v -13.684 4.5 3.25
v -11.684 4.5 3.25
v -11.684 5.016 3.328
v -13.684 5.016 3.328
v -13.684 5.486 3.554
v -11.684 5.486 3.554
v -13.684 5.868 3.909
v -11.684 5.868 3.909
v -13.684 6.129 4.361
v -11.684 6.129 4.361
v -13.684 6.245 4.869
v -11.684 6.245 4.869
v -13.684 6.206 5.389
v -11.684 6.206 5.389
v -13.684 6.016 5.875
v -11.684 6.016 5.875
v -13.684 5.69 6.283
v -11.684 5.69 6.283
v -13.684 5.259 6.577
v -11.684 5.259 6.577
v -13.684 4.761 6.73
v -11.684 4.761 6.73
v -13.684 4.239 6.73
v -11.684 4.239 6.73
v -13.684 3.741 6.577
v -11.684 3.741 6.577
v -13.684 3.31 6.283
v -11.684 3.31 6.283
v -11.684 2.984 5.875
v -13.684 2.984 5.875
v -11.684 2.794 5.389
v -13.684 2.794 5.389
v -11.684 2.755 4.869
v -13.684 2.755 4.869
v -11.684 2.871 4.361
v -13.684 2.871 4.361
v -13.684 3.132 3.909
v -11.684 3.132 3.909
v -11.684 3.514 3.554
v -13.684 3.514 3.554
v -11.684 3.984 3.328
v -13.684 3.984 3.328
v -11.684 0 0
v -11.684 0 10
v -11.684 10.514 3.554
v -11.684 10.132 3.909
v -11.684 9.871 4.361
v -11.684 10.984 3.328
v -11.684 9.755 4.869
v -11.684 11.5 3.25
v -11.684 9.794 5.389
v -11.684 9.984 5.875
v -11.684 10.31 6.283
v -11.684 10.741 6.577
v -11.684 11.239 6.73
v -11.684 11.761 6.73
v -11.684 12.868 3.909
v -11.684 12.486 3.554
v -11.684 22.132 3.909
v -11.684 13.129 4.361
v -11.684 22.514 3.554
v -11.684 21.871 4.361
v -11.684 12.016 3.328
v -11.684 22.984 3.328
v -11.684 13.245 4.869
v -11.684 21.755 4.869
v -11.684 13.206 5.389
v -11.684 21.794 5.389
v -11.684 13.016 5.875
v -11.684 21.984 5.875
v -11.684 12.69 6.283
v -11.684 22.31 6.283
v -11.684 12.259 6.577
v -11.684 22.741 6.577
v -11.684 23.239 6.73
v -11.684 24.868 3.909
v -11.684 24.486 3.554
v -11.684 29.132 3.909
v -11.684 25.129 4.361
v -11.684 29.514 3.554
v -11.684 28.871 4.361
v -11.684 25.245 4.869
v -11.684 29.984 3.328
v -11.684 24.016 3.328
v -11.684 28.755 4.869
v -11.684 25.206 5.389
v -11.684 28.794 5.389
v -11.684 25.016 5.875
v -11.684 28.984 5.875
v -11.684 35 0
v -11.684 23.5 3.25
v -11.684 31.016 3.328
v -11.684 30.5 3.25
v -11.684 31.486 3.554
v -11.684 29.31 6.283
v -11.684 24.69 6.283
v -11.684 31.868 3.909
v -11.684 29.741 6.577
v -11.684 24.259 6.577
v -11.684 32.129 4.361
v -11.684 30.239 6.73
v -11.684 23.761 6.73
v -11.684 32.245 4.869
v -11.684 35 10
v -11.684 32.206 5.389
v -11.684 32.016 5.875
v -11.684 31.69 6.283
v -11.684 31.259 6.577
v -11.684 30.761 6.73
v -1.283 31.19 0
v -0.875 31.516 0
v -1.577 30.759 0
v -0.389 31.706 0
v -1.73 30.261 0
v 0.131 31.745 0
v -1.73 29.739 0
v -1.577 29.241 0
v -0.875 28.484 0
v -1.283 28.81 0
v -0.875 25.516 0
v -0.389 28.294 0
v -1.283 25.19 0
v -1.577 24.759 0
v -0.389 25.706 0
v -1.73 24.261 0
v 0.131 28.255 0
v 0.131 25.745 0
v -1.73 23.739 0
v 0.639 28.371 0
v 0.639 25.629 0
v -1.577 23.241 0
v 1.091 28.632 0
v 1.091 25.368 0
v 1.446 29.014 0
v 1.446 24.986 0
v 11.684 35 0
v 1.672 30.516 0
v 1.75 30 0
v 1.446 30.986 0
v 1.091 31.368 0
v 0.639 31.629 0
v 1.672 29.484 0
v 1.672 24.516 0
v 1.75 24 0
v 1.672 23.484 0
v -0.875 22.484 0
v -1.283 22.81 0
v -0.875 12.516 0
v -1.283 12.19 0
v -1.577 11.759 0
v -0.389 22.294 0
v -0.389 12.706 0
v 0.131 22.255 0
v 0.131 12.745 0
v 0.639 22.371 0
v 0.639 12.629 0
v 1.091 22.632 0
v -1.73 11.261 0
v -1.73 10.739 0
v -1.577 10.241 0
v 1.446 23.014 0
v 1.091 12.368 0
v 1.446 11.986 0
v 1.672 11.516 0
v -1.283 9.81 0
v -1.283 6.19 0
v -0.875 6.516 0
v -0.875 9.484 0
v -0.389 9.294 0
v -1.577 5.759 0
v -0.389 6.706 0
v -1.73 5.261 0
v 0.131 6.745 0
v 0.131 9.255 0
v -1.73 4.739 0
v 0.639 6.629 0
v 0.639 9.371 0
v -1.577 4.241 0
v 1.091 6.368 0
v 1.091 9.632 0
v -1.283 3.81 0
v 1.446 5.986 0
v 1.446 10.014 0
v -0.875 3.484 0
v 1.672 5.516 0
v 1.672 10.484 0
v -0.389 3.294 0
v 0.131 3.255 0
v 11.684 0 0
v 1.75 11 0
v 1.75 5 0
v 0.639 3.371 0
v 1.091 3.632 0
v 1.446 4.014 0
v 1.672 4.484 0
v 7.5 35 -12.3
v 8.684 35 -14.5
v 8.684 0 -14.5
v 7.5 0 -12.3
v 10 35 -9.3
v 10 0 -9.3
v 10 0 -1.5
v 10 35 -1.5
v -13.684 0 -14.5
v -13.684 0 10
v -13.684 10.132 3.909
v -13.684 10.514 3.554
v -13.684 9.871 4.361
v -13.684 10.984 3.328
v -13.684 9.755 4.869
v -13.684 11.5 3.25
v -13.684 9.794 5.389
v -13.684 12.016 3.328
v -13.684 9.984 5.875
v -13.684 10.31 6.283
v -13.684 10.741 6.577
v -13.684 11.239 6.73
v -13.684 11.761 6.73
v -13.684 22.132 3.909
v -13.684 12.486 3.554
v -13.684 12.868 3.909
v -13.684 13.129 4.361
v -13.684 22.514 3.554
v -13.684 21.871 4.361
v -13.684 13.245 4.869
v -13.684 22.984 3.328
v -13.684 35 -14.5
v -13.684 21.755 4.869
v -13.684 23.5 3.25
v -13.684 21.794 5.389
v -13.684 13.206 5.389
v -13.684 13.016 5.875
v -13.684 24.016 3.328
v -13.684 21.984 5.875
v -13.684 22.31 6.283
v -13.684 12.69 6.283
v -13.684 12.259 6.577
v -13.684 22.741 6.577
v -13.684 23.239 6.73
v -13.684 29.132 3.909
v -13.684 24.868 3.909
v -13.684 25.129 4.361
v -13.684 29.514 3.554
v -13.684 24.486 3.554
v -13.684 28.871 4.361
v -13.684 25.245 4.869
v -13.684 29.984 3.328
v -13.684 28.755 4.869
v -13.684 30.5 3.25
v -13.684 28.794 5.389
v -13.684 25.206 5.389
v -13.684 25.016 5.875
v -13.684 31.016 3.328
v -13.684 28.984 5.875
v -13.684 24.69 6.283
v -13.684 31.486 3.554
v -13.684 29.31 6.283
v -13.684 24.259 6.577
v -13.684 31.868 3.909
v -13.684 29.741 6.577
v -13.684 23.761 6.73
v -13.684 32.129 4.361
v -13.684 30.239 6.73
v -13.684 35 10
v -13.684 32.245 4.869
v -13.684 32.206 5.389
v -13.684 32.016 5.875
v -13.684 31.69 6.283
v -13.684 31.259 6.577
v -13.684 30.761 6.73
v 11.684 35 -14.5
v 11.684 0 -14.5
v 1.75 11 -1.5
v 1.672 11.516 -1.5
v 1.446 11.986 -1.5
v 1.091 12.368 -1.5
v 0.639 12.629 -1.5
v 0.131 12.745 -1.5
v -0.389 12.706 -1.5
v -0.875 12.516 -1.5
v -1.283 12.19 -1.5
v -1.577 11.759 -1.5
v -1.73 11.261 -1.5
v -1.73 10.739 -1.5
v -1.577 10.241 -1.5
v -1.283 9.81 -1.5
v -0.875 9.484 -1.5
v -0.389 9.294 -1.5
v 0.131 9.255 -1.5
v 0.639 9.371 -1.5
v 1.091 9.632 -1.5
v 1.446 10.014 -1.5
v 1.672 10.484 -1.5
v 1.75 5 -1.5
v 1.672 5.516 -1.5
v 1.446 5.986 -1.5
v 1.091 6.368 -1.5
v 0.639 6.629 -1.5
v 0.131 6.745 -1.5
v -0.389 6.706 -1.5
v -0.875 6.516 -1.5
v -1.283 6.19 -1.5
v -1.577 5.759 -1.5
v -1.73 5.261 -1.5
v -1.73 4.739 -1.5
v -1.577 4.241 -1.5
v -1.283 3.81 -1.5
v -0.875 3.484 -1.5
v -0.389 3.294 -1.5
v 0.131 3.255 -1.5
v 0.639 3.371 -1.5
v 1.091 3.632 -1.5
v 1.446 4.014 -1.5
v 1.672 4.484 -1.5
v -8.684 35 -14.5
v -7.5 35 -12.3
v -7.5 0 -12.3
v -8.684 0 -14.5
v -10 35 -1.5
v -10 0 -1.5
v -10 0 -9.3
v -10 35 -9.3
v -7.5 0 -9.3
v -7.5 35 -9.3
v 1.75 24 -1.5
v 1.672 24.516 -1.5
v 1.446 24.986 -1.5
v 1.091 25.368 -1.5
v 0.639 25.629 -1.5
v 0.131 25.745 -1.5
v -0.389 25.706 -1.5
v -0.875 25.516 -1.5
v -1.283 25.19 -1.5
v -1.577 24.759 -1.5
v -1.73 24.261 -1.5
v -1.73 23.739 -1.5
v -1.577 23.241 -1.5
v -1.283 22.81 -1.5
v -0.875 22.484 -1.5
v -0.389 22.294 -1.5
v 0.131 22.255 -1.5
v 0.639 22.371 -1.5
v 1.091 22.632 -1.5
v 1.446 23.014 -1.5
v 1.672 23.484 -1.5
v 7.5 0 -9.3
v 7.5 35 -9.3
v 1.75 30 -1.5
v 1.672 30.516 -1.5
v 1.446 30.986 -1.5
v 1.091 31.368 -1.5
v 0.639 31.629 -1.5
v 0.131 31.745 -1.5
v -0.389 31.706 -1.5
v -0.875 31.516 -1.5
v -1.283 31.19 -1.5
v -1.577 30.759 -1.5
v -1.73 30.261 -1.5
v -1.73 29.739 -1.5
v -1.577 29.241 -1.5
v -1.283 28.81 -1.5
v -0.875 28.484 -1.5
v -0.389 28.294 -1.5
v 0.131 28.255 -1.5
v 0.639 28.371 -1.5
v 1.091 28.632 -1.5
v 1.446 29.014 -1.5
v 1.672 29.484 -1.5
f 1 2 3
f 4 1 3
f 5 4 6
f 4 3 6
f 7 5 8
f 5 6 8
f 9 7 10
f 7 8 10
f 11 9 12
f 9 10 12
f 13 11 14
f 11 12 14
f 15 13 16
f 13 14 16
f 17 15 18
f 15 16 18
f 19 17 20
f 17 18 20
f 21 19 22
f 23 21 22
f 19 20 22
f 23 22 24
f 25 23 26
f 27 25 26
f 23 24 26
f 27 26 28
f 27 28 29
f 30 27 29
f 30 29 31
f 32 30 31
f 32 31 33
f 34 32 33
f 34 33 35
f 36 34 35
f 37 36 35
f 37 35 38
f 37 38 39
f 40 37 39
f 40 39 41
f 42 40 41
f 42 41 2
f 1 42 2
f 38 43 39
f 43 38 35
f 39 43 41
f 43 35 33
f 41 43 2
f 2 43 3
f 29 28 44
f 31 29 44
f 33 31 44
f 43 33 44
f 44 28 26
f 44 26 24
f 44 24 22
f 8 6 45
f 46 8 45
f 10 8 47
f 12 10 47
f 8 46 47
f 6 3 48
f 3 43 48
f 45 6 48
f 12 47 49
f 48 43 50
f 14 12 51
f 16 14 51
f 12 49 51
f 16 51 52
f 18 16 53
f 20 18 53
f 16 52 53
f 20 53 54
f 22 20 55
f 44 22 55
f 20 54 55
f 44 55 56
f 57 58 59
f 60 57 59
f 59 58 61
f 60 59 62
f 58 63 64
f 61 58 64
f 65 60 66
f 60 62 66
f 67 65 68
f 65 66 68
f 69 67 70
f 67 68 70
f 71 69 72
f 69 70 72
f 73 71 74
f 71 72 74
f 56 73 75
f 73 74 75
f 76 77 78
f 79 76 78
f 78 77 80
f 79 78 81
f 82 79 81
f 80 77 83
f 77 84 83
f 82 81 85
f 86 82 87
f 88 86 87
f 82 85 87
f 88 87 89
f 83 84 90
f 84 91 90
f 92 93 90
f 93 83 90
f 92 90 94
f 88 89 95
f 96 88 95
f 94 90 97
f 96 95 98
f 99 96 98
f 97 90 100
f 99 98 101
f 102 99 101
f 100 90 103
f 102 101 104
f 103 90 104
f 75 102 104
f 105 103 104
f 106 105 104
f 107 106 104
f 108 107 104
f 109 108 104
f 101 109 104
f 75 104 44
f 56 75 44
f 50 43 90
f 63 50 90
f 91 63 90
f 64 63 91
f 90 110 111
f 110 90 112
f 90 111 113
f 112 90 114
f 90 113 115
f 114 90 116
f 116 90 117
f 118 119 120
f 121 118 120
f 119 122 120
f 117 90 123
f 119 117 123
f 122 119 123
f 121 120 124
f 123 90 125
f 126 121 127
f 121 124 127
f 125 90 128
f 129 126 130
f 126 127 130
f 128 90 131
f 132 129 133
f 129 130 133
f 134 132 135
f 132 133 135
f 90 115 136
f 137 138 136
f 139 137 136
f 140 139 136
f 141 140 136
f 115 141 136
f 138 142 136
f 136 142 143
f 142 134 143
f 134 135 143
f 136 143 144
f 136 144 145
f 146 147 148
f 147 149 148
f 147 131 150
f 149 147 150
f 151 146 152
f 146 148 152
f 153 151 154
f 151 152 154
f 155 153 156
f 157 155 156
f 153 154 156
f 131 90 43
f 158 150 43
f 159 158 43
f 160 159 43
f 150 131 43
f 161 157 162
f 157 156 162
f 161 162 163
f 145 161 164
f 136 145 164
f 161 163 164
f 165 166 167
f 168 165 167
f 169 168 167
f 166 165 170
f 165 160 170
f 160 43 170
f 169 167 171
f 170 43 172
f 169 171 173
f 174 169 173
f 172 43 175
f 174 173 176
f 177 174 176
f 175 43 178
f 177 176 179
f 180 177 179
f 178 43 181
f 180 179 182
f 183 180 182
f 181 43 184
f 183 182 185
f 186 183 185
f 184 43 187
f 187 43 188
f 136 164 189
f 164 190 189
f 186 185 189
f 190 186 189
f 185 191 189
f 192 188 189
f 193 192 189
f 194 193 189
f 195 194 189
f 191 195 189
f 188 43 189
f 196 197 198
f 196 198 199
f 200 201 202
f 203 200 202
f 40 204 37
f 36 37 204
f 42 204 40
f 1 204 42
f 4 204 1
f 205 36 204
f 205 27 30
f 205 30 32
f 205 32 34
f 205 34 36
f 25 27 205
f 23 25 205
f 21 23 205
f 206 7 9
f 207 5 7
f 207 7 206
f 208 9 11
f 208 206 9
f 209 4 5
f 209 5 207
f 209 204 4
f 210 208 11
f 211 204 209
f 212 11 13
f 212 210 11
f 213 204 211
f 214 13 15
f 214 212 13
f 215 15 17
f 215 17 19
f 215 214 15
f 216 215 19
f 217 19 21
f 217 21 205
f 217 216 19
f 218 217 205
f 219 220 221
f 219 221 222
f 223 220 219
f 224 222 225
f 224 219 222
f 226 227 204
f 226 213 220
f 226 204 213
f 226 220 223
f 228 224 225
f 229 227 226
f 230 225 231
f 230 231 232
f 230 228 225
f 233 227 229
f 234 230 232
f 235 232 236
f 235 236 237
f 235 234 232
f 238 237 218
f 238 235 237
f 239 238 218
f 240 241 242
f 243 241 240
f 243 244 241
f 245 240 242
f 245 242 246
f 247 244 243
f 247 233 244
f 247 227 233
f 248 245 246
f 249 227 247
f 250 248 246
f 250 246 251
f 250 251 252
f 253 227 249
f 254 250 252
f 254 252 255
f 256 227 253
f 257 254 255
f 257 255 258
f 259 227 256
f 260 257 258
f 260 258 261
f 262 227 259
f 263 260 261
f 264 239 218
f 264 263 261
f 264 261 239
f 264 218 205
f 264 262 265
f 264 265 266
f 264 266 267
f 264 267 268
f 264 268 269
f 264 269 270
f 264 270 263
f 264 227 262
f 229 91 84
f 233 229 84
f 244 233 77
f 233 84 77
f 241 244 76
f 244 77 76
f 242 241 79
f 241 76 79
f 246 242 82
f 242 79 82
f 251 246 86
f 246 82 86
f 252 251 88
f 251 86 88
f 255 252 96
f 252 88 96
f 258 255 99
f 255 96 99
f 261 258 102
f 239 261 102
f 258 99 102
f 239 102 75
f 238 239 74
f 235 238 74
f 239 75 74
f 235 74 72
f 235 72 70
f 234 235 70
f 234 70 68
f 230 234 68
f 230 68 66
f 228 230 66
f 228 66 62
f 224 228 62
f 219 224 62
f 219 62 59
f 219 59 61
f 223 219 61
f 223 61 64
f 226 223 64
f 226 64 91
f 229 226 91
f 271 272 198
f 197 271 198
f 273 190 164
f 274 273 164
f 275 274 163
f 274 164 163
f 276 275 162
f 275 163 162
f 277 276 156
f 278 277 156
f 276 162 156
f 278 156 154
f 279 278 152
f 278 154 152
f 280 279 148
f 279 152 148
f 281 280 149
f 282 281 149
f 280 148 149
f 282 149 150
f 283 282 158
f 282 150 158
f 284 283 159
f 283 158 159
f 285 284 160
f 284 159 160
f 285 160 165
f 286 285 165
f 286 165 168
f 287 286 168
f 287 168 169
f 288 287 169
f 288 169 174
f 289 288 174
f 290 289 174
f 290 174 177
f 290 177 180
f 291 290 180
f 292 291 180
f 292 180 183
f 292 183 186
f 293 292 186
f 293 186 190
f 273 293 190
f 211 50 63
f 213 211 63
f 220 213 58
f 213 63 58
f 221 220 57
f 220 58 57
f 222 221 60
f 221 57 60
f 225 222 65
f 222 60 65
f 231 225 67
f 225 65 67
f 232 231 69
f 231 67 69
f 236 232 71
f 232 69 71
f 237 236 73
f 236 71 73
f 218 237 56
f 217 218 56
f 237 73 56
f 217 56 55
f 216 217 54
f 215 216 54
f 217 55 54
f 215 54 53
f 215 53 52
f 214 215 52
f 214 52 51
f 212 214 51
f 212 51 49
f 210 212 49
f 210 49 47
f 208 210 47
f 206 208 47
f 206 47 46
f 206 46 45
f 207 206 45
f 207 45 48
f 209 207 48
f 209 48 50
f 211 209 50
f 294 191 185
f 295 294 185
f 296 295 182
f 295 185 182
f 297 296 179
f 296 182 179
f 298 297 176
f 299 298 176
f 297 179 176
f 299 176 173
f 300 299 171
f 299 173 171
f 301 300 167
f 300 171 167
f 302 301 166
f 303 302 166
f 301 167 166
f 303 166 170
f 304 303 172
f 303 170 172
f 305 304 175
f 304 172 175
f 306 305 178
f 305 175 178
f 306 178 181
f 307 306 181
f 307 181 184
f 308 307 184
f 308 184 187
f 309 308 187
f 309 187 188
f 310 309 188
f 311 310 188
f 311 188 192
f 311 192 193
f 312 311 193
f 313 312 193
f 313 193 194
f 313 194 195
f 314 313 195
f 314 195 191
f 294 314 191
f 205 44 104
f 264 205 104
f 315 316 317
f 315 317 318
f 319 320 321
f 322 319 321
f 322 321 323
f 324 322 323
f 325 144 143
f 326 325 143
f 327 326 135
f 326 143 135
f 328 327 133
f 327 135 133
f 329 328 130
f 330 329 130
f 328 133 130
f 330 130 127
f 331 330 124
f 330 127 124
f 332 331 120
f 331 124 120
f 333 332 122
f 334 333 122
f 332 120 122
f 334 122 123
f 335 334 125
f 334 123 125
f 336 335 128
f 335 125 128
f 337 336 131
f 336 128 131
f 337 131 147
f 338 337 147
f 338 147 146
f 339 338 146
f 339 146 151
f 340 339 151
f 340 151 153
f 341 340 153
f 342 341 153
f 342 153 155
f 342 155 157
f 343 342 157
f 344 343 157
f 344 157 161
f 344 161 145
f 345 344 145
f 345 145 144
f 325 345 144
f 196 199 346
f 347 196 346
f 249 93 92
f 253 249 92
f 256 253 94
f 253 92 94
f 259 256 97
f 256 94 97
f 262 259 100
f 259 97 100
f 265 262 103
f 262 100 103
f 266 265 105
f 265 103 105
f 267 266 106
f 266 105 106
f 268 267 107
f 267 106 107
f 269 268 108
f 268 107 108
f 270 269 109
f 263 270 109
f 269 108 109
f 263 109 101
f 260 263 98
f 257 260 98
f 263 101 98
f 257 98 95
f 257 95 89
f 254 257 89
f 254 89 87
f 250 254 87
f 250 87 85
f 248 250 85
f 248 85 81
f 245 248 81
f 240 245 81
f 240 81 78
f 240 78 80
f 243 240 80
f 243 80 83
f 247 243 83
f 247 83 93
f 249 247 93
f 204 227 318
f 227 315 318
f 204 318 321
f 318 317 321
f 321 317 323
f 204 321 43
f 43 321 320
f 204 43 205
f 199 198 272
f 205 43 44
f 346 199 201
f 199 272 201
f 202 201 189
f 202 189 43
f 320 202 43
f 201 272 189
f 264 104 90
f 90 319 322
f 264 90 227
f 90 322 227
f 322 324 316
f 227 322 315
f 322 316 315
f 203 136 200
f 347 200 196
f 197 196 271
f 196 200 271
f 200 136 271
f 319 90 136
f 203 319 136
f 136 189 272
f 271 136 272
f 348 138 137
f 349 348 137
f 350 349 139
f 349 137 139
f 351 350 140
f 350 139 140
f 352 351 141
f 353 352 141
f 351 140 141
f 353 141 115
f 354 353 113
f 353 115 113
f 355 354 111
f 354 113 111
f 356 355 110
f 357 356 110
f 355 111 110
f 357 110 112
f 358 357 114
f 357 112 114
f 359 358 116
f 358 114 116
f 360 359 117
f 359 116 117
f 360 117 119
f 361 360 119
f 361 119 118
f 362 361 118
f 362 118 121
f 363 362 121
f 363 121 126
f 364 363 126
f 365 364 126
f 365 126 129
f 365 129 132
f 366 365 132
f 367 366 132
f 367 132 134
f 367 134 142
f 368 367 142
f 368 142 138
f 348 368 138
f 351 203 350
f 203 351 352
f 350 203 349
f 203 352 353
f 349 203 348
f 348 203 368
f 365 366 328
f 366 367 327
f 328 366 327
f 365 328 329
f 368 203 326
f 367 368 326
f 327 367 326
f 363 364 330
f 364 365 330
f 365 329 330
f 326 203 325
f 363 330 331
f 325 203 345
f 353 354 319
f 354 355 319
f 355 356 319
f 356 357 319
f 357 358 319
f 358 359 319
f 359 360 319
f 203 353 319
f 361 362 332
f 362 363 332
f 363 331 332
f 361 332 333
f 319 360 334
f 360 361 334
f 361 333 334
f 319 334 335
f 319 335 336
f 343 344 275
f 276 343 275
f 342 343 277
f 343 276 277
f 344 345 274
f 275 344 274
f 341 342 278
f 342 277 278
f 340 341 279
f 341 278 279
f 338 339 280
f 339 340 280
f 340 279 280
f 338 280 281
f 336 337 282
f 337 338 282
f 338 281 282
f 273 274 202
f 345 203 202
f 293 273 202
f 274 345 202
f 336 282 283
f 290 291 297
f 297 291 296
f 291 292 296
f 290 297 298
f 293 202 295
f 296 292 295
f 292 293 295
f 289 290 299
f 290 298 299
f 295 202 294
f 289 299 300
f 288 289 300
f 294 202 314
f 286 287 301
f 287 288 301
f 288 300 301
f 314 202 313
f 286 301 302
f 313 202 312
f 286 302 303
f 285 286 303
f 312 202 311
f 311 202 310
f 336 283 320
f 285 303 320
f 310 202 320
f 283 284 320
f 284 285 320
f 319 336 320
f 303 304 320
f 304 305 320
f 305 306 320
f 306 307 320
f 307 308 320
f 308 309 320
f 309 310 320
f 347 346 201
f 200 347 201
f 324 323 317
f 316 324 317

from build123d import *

# Parameters (mm, degrees)
BOSS_EXTRUDE1_DEPTH = 35
SKETCH2_R           = 1.75
CUT_EXTRUDE1_DEPTH  = 10
MOUNTING_WING_DEPTH = 2
SKETCH5_R           = 1.75
CUT_EXTRUDE2_DEPTH  = 3.5


with BuildPart() as part:
    # Sketch1 → Boss-Extrude1 (new body)
    with BuildSketch(Plane(origin=(0, 0, 0), x_dir=(1, 0, 0), z_dir=(0, 1, 0))):
        Polygon((-11.683800623, 0), (11.683800623, 0), (11.683800623, 14.5), (8.683800623, 14.5), (7.5, 12.3), (7.5, 9.3), (10, 9.3), (10, 1.5), (-10, 1.5), (-10, 9.3), (-7.5, 9.3), (-7.5, 12.3), (-8.683800623, 14.5), (-11.683800623, 14.5), align=None)
    extrude(amount=BOSS_EXTRUDE1_DEPTH)

    # Sketch2 → Cut-Extrude1 (cut)
    with BuildSketch(Plane.XY):
        with Locations((0, 5)):
            Circle(SKETCH2_R)
        with Locations((0, 24)):
            Circle(SKETCH2_R)
        with Locations((0, 11)):
            Circle(SKETCH2_R)
        with Locations((0, 30)):
            Circle(SKETCH2_R)
    extrude(amount=-CUT_EXTRUDE1_DEPTH, mode=Mode.SUBTRACT)

    # Optical Mount → Mounting Wing (add)
    with BuildSketch(Plane.ZY.offset(11.683800623)):
        Polygon((0, 0), (10, 0), (10, 35), (0, 35), (-14.5, 35), (-14.5, 0), align=None)
    extrude(amount=MOUNTING_WING_DEPTH)

    # Sketch5 → Cut-Extrude2 (cut)
    with BuildSketch(Plane(origin=(-11.683800623, 0, 0), x_dir=(0, 0, -1), z_dir=(1, 0, 0))):
        with Locations((-5, 4.5)):
            Circle(SKETCH5_R)
        with Locations((-5, 11.5)):
            Circle(SKETCH5_R)
        with Locations((-5, 23.5)):
            Circle(SKETCH5_R)
        with Locations((-5, 30.5)):
            Circle(SKETCH5_R)
    extrude(amount=-CUT_EXTRUDE2_DEPTH, mode=Mode.SUBTRACT)


solid = part.part
